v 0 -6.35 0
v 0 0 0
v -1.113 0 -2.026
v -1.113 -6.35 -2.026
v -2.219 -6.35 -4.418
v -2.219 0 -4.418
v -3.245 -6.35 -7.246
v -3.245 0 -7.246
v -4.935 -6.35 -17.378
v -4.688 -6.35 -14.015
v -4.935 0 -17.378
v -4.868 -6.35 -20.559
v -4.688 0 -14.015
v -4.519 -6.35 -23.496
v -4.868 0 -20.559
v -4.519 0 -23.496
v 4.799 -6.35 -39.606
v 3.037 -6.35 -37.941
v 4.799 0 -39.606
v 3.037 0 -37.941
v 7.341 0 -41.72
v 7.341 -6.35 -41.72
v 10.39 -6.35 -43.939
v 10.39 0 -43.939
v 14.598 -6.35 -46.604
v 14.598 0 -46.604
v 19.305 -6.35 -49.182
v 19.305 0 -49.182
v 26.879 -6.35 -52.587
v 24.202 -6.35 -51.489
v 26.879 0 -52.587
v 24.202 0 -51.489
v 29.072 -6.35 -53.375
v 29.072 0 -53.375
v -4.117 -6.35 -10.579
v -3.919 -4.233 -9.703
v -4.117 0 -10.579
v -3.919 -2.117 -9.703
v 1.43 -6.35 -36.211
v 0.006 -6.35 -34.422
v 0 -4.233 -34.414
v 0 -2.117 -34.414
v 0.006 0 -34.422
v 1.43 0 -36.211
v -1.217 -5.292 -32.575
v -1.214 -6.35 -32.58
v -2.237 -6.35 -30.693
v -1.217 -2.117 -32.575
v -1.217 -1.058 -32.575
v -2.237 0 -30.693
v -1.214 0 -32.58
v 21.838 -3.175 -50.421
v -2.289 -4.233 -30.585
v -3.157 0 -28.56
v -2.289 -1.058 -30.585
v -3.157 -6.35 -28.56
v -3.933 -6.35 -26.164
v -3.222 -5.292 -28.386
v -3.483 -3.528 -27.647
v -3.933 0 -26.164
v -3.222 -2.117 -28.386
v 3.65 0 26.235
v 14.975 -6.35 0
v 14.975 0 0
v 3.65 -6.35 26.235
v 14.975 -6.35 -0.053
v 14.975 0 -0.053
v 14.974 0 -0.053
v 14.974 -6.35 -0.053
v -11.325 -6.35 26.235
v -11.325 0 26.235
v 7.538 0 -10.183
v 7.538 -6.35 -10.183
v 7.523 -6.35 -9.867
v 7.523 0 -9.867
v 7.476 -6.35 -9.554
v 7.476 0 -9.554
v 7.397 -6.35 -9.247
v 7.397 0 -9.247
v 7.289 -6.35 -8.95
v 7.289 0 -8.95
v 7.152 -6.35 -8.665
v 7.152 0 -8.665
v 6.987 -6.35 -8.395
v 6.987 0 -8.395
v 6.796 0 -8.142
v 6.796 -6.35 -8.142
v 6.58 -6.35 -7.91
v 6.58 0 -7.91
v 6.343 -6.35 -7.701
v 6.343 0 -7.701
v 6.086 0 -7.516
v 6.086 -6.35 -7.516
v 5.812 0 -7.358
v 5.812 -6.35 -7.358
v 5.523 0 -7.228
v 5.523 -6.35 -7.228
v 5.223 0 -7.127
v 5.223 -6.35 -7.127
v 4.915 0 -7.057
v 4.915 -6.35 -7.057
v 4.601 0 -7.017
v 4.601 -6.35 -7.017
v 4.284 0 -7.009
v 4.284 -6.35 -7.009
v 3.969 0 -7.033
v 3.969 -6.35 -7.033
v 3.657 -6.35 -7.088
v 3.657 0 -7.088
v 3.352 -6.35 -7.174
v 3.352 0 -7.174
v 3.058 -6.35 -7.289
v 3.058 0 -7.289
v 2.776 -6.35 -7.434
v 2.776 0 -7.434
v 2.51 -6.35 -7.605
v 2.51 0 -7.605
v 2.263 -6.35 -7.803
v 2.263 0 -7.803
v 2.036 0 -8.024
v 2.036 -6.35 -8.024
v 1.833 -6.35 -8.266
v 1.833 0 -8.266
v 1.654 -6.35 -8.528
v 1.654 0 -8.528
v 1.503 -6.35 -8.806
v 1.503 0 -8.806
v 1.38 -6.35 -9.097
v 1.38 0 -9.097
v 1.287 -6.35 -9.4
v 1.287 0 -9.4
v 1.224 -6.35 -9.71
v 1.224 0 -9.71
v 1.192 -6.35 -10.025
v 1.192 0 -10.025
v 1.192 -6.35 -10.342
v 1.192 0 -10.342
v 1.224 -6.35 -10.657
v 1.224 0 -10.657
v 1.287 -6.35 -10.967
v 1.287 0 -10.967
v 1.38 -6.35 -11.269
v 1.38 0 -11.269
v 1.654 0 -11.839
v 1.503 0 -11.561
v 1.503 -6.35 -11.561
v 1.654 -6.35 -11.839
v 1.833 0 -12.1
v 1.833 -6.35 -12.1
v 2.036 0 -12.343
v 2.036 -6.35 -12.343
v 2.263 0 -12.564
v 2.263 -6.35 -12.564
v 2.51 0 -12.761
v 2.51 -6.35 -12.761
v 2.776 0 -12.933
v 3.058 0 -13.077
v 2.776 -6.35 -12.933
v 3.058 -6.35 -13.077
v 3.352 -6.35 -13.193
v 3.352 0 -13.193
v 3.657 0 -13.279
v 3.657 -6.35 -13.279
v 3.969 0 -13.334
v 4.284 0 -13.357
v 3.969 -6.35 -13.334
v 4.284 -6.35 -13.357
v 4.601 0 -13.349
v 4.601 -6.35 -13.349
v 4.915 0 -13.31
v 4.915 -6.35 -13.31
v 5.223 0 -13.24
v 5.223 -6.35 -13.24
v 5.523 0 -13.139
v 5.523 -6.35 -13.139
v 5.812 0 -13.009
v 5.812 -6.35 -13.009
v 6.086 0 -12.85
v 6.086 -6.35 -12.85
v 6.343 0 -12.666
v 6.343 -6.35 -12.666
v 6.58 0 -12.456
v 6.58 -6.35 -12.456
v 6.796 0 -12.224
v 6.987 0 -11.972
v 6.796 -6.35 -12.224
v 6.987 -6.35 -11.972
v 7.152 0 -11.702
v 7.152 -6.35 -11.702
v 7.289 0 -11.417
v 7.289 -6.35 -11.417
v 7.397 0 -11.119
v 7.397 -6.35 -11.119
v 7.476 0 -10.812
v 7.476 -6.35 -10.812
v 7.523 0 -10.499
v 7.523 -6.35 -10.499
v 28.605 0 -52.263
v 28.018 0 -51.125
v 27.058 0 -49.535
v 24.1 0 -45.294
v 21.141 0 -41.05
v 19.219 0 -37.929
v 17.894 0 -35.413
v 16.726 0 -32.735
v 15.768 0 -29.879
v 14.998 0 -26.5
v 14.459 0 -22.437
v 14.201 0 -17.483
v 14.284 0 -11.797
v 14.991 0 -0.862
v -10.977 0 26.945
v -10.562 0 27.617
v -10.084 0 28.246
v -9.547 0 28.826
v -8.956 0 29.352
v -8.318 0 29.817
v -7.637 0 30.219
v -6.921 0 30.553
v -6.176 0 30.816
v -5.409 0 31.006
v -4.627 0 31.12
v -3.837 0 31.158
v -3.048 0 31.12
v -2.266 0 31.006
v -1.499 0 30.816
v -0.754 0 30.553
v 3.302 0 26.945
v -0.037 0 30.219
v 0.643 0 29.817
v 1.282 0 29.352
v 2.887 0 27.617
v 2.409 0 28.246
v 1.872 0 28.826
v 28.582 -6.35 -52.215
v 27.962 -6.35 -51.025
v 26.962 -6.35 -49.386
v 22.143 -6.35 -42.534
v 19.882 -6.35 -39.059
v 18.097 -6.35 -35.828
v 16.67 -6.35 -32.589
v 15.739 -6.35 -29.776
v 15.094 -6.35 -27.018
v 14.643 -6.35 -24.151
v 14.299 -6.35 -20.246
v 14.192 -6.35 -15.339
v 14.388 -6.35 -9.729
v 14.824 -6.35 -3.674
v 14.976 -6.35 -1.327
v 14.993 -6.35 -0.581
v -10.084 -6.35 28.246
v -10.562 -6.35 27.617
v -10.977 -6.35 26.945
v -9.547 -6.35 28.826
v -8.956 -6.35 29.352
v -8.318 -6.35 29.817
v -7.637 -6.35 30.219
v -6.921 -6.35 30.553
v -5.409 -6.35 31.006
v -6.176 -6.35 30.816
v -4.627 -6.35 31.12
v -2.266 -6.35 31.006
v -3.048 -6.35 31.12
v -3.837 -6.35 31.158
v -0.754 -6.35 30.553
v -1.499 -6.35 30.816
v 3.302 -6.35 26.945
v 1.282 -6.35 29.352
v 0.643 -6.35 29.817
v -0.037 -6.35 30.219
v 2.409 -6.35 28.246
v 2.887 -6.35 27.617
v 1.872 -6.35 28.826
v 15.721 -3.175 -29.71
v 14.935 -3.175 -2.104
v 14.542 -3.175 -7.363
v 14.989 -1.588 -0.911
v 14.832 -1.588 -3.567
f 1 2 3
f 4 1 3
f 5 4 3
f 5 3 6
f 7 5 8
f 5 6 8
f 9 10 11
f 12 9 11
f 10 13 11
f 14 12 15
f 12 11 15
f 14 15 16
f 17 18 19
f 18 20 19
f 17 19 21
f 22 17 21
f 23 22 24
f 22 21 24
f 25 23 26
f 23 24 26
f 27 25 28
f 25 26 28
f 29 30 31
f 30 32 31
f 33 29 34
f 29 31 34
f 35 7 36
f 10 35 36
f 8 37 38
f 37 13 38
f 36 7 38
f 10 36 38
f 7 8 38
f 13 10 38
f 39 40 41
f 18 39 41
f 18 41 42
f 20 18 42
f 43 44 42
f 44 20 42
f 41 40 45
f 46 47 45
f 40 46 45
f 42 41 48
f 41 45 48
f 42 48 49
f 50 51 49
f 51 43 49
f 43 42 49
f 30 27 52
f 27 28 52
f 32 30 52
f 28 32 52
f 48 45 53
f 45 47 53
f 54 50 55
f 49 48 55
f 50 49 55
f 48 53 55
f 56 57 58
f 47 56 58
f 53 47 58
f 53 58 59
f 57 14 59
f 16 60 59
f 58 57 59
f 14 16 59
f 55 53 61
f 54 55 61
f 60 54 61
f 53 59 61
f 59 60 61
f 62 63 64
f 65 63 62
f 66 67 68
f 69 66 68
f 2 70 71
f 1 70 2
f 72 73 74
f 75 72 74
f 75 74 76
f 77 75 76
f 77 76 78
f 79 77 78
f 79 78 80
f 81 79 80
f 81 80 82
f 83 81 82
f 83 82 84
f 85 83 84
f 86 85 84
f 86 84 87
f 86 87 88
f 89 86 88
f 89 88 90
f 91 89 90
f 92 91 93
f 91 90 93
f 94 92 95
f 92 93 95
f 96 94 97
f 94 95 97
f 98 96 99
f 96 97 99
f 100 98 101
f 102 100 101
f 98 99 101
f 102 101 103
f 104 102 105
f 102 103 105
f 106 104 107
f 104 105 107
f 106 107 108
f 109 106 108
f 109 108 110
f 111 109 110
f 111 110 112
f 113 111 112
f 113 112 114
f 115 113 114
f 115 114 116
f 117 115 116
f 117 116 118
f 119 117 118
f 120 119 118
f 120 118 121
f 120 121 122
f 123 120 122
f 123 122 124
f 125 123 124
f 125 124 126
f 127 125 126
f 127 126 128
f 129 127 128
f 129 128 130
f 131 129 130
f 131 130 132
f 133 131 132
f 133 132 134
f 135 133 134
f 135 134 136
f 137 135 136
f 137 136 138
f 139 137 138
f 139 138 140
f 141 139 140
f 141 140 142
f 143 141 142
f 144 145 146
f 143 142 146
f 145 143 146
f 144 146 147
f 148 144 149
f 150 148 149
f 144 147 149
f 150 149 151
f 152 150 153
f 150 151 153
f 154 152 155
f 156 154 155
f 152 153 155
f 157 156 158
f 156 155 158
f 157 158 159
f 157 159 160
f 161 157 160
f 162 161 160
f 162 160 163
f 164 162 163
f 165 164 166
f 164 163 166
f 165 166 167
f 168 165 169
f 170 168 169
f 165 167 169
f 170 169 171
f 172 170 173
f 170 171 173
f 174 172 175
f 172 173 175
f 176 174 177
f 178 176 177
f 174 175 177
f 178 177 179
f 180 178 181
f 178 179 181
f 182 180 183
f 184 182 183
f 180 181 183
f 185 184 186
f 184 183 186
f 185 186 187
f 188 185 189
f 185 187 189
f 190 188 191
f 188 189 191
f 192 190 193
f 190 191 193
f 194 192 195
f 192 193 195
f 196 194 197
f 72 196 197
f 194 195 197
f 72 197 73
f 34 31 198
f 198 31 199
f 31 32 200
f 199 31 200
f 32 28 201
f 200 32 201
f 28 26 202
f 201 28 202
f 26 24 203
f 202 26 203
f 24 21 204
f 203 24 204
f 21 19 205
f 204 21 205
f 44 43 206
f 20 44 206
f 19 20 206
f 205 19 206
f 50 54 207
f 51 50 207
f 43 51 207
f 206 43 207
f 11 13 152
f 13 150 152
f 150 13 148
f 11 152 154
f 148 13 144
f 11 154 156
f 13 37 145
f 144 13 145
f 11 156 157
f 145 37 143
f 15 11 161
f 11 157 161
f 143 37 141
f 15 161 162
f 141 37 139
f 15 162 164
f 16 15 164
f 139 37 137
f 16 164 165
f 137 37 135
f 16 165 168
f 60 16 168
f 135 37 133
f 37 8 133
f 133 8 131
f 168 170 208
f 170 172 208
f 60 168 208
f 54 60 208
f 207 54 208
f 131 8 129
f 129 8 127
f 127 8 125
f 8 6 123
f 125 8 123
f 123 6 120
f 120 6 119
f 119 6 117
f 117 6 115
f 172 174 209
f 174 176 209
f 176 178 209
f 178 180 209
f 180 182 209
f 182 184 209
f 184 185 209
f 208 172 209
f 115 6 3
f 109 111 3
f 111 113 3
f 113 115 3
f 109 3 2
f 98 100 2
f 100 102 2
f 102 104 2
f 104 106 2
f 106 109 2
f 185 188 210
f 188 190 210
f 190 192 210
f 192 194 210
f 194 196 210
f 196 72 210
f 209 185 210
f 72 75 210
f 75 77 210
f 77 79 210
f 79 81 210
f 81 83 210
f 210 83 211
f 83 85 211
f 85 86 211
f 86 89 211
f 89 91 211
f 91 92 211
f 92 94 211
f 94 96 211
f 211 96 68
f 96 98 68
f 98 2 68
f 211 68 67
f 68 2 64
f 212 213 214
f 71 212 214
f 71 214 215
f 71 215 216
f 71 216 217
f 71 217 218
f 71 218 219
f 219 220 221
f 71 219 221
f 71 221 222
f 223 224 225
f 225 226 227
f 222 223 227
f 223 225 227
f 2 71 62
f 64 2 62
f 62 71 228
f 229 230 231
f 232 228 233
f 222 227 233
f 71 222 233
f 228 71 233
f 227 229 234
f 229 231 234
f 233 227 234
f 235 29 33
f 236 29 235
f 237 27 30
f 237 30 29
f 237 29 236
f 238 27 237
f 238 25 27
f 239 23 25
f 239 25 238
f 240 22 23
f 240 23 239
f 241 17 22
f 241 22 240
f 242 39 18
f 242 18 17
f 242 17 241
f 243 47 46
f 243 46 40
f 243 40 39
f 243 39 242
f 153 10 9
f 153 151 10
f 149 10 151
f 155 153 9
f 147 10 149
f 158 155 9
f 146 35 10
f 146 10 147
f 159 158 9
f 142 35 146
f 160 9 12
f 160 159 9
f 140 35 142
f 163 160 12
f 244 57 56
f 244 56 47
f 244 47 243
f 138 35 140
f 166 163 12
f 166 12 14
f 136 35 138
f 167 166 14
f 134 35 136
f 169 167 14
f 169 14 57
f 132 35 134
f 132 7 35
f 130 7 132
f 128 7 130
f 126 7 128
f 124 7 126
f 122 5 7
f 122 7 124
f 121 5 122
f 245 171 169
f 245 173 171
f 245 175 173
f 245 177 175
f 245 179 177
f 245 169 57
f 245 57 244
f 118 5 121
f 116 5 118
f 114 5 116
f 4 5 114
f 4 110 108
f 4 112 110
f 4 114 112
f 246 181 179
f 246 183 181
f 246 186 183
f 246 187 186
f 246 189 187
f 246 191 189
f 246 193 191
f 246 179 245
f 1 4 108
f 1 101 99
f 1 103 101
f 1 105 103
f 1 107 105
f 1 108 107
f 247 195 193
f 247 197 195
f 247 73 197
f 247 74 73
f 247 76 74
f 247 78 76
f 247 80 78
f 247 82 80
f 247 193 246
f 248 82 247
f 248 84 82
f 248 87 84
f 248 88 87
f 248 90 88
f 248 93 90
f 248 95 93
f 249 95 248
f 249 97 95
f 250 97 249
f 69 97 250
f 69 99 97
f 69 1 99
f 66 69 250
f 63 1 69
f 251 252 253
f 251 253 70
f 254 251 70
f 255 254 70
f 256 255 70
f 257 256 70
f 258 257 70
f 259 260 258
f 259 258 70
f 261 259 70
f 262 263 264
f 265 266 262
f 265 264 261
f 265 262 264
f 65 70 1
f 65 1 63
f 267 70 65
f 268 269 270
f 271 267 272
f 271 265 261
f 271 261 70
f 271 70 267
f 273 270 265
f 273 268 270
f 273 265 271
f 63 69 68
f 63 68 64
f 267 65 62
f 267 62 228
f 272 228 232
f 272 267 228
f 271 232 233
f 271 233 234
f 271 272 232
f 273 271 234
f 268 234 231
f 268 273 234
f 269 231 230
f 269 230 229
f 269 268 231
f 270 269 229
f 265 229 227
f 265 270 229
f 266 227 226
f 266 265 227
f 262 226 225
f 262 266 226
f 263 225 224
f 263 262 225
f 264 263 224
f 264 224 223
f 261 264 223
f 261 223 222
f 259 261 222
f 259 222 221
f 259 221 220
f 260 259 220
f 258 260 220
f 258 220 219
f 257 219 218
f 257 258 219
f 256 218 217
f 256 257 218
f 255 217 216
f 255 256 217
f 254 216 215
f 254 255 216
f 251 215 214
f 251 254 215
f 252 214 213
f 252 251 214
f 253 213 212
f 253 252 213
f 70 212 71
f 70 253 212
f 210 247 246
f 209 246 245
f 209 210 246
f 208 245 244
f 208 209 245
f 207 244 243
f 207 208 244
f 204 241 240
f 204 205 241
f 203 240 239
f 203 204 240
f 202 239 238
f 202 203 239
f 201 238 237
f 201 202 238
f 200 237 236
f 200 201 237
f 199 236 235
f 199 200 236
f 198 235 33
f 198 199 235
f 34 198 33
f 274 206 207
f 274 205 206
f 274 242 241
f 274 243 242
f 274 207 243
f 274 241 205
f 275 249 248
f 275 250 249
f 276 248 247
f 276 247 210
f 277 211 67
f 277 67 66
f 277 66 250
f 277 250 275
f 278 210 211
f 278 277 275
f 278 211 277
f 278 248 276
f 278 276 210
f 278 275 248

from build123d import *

# Parameters (mm, degrees)
F1_DEPTH = 6.35
F3_DEPTH = 6.35
F4_R     = 3.175
F5_DEPTH = 25.4


with BuildPart() as f1:
    # F0 (on Front) → F1 (new body)
    with BuildSketch(Plane.XZ):
        with BuildLine():
            Line((14.9751729332, -0.0525450014), (0, 0))
            add(Edge.make_bspline(
                [(0, 0), (-1.3668231297, -2.3331721875), (-5.2378895093, -10.0511172277), (-6.4457044175, -37.83273039), (22.8338454247, -51.3333554001), (29.0720630437, -53.3747412264)],
                knots=[0, 0, 0, 0, 0.2289680224, 0.5830056766, 1, 1, 1, 1], degree=3))
            add(Edge.make_bspline(
                [(14.9751729332, -0.0525450014), (15.2322824358, -3.22988805), (10.116460043, -33.133102304), (26.89550583, -47.4094833328), (29.0720630437, -53.3747412264)],
                knots=[0, 0, 0, 0, 0.5109782958, 1, 1, 1, 1], degree=3))
        make_face()
    extrude(amount=F1_DEPTH)

    # F2 (on face) → F3 (join)
    with BuildSketch(Plane.XZ.offset(6.35)):
        with BuildLine():
            Line((-11.3248755646, 26.2350494272), (0, 0))
            Line((0, 0), (1.3590909073, -2.1867099784))
            Line((1.3590909073, -2.1867099784), (14.9297209254, -2.1867099784))
            Line((14.9297209254, -2.1867099784), (14.9751729332, 0))
            Line((14.9751729332, 0), (3.6502973686, 26.2350494272))
            ThreePointArc((3.6502973686, 26.2350494272), (-3.837289098, 31.1583029026), (-11.3248755646, 26.2350494272))
        make_face()
    extrude(amount=-F3_DEPTH)

    # F4 (on face) → F5 (cut)
    with BuildSketch(Plane.XZ.offset(6.35)):
        with Locations((4.3634679168, -10.1833054796)):
            Circle(F4_R)
    extrude(amount=-F5_DEPTH, mode=Mode.SUBTRACT)


solid = f1.part
